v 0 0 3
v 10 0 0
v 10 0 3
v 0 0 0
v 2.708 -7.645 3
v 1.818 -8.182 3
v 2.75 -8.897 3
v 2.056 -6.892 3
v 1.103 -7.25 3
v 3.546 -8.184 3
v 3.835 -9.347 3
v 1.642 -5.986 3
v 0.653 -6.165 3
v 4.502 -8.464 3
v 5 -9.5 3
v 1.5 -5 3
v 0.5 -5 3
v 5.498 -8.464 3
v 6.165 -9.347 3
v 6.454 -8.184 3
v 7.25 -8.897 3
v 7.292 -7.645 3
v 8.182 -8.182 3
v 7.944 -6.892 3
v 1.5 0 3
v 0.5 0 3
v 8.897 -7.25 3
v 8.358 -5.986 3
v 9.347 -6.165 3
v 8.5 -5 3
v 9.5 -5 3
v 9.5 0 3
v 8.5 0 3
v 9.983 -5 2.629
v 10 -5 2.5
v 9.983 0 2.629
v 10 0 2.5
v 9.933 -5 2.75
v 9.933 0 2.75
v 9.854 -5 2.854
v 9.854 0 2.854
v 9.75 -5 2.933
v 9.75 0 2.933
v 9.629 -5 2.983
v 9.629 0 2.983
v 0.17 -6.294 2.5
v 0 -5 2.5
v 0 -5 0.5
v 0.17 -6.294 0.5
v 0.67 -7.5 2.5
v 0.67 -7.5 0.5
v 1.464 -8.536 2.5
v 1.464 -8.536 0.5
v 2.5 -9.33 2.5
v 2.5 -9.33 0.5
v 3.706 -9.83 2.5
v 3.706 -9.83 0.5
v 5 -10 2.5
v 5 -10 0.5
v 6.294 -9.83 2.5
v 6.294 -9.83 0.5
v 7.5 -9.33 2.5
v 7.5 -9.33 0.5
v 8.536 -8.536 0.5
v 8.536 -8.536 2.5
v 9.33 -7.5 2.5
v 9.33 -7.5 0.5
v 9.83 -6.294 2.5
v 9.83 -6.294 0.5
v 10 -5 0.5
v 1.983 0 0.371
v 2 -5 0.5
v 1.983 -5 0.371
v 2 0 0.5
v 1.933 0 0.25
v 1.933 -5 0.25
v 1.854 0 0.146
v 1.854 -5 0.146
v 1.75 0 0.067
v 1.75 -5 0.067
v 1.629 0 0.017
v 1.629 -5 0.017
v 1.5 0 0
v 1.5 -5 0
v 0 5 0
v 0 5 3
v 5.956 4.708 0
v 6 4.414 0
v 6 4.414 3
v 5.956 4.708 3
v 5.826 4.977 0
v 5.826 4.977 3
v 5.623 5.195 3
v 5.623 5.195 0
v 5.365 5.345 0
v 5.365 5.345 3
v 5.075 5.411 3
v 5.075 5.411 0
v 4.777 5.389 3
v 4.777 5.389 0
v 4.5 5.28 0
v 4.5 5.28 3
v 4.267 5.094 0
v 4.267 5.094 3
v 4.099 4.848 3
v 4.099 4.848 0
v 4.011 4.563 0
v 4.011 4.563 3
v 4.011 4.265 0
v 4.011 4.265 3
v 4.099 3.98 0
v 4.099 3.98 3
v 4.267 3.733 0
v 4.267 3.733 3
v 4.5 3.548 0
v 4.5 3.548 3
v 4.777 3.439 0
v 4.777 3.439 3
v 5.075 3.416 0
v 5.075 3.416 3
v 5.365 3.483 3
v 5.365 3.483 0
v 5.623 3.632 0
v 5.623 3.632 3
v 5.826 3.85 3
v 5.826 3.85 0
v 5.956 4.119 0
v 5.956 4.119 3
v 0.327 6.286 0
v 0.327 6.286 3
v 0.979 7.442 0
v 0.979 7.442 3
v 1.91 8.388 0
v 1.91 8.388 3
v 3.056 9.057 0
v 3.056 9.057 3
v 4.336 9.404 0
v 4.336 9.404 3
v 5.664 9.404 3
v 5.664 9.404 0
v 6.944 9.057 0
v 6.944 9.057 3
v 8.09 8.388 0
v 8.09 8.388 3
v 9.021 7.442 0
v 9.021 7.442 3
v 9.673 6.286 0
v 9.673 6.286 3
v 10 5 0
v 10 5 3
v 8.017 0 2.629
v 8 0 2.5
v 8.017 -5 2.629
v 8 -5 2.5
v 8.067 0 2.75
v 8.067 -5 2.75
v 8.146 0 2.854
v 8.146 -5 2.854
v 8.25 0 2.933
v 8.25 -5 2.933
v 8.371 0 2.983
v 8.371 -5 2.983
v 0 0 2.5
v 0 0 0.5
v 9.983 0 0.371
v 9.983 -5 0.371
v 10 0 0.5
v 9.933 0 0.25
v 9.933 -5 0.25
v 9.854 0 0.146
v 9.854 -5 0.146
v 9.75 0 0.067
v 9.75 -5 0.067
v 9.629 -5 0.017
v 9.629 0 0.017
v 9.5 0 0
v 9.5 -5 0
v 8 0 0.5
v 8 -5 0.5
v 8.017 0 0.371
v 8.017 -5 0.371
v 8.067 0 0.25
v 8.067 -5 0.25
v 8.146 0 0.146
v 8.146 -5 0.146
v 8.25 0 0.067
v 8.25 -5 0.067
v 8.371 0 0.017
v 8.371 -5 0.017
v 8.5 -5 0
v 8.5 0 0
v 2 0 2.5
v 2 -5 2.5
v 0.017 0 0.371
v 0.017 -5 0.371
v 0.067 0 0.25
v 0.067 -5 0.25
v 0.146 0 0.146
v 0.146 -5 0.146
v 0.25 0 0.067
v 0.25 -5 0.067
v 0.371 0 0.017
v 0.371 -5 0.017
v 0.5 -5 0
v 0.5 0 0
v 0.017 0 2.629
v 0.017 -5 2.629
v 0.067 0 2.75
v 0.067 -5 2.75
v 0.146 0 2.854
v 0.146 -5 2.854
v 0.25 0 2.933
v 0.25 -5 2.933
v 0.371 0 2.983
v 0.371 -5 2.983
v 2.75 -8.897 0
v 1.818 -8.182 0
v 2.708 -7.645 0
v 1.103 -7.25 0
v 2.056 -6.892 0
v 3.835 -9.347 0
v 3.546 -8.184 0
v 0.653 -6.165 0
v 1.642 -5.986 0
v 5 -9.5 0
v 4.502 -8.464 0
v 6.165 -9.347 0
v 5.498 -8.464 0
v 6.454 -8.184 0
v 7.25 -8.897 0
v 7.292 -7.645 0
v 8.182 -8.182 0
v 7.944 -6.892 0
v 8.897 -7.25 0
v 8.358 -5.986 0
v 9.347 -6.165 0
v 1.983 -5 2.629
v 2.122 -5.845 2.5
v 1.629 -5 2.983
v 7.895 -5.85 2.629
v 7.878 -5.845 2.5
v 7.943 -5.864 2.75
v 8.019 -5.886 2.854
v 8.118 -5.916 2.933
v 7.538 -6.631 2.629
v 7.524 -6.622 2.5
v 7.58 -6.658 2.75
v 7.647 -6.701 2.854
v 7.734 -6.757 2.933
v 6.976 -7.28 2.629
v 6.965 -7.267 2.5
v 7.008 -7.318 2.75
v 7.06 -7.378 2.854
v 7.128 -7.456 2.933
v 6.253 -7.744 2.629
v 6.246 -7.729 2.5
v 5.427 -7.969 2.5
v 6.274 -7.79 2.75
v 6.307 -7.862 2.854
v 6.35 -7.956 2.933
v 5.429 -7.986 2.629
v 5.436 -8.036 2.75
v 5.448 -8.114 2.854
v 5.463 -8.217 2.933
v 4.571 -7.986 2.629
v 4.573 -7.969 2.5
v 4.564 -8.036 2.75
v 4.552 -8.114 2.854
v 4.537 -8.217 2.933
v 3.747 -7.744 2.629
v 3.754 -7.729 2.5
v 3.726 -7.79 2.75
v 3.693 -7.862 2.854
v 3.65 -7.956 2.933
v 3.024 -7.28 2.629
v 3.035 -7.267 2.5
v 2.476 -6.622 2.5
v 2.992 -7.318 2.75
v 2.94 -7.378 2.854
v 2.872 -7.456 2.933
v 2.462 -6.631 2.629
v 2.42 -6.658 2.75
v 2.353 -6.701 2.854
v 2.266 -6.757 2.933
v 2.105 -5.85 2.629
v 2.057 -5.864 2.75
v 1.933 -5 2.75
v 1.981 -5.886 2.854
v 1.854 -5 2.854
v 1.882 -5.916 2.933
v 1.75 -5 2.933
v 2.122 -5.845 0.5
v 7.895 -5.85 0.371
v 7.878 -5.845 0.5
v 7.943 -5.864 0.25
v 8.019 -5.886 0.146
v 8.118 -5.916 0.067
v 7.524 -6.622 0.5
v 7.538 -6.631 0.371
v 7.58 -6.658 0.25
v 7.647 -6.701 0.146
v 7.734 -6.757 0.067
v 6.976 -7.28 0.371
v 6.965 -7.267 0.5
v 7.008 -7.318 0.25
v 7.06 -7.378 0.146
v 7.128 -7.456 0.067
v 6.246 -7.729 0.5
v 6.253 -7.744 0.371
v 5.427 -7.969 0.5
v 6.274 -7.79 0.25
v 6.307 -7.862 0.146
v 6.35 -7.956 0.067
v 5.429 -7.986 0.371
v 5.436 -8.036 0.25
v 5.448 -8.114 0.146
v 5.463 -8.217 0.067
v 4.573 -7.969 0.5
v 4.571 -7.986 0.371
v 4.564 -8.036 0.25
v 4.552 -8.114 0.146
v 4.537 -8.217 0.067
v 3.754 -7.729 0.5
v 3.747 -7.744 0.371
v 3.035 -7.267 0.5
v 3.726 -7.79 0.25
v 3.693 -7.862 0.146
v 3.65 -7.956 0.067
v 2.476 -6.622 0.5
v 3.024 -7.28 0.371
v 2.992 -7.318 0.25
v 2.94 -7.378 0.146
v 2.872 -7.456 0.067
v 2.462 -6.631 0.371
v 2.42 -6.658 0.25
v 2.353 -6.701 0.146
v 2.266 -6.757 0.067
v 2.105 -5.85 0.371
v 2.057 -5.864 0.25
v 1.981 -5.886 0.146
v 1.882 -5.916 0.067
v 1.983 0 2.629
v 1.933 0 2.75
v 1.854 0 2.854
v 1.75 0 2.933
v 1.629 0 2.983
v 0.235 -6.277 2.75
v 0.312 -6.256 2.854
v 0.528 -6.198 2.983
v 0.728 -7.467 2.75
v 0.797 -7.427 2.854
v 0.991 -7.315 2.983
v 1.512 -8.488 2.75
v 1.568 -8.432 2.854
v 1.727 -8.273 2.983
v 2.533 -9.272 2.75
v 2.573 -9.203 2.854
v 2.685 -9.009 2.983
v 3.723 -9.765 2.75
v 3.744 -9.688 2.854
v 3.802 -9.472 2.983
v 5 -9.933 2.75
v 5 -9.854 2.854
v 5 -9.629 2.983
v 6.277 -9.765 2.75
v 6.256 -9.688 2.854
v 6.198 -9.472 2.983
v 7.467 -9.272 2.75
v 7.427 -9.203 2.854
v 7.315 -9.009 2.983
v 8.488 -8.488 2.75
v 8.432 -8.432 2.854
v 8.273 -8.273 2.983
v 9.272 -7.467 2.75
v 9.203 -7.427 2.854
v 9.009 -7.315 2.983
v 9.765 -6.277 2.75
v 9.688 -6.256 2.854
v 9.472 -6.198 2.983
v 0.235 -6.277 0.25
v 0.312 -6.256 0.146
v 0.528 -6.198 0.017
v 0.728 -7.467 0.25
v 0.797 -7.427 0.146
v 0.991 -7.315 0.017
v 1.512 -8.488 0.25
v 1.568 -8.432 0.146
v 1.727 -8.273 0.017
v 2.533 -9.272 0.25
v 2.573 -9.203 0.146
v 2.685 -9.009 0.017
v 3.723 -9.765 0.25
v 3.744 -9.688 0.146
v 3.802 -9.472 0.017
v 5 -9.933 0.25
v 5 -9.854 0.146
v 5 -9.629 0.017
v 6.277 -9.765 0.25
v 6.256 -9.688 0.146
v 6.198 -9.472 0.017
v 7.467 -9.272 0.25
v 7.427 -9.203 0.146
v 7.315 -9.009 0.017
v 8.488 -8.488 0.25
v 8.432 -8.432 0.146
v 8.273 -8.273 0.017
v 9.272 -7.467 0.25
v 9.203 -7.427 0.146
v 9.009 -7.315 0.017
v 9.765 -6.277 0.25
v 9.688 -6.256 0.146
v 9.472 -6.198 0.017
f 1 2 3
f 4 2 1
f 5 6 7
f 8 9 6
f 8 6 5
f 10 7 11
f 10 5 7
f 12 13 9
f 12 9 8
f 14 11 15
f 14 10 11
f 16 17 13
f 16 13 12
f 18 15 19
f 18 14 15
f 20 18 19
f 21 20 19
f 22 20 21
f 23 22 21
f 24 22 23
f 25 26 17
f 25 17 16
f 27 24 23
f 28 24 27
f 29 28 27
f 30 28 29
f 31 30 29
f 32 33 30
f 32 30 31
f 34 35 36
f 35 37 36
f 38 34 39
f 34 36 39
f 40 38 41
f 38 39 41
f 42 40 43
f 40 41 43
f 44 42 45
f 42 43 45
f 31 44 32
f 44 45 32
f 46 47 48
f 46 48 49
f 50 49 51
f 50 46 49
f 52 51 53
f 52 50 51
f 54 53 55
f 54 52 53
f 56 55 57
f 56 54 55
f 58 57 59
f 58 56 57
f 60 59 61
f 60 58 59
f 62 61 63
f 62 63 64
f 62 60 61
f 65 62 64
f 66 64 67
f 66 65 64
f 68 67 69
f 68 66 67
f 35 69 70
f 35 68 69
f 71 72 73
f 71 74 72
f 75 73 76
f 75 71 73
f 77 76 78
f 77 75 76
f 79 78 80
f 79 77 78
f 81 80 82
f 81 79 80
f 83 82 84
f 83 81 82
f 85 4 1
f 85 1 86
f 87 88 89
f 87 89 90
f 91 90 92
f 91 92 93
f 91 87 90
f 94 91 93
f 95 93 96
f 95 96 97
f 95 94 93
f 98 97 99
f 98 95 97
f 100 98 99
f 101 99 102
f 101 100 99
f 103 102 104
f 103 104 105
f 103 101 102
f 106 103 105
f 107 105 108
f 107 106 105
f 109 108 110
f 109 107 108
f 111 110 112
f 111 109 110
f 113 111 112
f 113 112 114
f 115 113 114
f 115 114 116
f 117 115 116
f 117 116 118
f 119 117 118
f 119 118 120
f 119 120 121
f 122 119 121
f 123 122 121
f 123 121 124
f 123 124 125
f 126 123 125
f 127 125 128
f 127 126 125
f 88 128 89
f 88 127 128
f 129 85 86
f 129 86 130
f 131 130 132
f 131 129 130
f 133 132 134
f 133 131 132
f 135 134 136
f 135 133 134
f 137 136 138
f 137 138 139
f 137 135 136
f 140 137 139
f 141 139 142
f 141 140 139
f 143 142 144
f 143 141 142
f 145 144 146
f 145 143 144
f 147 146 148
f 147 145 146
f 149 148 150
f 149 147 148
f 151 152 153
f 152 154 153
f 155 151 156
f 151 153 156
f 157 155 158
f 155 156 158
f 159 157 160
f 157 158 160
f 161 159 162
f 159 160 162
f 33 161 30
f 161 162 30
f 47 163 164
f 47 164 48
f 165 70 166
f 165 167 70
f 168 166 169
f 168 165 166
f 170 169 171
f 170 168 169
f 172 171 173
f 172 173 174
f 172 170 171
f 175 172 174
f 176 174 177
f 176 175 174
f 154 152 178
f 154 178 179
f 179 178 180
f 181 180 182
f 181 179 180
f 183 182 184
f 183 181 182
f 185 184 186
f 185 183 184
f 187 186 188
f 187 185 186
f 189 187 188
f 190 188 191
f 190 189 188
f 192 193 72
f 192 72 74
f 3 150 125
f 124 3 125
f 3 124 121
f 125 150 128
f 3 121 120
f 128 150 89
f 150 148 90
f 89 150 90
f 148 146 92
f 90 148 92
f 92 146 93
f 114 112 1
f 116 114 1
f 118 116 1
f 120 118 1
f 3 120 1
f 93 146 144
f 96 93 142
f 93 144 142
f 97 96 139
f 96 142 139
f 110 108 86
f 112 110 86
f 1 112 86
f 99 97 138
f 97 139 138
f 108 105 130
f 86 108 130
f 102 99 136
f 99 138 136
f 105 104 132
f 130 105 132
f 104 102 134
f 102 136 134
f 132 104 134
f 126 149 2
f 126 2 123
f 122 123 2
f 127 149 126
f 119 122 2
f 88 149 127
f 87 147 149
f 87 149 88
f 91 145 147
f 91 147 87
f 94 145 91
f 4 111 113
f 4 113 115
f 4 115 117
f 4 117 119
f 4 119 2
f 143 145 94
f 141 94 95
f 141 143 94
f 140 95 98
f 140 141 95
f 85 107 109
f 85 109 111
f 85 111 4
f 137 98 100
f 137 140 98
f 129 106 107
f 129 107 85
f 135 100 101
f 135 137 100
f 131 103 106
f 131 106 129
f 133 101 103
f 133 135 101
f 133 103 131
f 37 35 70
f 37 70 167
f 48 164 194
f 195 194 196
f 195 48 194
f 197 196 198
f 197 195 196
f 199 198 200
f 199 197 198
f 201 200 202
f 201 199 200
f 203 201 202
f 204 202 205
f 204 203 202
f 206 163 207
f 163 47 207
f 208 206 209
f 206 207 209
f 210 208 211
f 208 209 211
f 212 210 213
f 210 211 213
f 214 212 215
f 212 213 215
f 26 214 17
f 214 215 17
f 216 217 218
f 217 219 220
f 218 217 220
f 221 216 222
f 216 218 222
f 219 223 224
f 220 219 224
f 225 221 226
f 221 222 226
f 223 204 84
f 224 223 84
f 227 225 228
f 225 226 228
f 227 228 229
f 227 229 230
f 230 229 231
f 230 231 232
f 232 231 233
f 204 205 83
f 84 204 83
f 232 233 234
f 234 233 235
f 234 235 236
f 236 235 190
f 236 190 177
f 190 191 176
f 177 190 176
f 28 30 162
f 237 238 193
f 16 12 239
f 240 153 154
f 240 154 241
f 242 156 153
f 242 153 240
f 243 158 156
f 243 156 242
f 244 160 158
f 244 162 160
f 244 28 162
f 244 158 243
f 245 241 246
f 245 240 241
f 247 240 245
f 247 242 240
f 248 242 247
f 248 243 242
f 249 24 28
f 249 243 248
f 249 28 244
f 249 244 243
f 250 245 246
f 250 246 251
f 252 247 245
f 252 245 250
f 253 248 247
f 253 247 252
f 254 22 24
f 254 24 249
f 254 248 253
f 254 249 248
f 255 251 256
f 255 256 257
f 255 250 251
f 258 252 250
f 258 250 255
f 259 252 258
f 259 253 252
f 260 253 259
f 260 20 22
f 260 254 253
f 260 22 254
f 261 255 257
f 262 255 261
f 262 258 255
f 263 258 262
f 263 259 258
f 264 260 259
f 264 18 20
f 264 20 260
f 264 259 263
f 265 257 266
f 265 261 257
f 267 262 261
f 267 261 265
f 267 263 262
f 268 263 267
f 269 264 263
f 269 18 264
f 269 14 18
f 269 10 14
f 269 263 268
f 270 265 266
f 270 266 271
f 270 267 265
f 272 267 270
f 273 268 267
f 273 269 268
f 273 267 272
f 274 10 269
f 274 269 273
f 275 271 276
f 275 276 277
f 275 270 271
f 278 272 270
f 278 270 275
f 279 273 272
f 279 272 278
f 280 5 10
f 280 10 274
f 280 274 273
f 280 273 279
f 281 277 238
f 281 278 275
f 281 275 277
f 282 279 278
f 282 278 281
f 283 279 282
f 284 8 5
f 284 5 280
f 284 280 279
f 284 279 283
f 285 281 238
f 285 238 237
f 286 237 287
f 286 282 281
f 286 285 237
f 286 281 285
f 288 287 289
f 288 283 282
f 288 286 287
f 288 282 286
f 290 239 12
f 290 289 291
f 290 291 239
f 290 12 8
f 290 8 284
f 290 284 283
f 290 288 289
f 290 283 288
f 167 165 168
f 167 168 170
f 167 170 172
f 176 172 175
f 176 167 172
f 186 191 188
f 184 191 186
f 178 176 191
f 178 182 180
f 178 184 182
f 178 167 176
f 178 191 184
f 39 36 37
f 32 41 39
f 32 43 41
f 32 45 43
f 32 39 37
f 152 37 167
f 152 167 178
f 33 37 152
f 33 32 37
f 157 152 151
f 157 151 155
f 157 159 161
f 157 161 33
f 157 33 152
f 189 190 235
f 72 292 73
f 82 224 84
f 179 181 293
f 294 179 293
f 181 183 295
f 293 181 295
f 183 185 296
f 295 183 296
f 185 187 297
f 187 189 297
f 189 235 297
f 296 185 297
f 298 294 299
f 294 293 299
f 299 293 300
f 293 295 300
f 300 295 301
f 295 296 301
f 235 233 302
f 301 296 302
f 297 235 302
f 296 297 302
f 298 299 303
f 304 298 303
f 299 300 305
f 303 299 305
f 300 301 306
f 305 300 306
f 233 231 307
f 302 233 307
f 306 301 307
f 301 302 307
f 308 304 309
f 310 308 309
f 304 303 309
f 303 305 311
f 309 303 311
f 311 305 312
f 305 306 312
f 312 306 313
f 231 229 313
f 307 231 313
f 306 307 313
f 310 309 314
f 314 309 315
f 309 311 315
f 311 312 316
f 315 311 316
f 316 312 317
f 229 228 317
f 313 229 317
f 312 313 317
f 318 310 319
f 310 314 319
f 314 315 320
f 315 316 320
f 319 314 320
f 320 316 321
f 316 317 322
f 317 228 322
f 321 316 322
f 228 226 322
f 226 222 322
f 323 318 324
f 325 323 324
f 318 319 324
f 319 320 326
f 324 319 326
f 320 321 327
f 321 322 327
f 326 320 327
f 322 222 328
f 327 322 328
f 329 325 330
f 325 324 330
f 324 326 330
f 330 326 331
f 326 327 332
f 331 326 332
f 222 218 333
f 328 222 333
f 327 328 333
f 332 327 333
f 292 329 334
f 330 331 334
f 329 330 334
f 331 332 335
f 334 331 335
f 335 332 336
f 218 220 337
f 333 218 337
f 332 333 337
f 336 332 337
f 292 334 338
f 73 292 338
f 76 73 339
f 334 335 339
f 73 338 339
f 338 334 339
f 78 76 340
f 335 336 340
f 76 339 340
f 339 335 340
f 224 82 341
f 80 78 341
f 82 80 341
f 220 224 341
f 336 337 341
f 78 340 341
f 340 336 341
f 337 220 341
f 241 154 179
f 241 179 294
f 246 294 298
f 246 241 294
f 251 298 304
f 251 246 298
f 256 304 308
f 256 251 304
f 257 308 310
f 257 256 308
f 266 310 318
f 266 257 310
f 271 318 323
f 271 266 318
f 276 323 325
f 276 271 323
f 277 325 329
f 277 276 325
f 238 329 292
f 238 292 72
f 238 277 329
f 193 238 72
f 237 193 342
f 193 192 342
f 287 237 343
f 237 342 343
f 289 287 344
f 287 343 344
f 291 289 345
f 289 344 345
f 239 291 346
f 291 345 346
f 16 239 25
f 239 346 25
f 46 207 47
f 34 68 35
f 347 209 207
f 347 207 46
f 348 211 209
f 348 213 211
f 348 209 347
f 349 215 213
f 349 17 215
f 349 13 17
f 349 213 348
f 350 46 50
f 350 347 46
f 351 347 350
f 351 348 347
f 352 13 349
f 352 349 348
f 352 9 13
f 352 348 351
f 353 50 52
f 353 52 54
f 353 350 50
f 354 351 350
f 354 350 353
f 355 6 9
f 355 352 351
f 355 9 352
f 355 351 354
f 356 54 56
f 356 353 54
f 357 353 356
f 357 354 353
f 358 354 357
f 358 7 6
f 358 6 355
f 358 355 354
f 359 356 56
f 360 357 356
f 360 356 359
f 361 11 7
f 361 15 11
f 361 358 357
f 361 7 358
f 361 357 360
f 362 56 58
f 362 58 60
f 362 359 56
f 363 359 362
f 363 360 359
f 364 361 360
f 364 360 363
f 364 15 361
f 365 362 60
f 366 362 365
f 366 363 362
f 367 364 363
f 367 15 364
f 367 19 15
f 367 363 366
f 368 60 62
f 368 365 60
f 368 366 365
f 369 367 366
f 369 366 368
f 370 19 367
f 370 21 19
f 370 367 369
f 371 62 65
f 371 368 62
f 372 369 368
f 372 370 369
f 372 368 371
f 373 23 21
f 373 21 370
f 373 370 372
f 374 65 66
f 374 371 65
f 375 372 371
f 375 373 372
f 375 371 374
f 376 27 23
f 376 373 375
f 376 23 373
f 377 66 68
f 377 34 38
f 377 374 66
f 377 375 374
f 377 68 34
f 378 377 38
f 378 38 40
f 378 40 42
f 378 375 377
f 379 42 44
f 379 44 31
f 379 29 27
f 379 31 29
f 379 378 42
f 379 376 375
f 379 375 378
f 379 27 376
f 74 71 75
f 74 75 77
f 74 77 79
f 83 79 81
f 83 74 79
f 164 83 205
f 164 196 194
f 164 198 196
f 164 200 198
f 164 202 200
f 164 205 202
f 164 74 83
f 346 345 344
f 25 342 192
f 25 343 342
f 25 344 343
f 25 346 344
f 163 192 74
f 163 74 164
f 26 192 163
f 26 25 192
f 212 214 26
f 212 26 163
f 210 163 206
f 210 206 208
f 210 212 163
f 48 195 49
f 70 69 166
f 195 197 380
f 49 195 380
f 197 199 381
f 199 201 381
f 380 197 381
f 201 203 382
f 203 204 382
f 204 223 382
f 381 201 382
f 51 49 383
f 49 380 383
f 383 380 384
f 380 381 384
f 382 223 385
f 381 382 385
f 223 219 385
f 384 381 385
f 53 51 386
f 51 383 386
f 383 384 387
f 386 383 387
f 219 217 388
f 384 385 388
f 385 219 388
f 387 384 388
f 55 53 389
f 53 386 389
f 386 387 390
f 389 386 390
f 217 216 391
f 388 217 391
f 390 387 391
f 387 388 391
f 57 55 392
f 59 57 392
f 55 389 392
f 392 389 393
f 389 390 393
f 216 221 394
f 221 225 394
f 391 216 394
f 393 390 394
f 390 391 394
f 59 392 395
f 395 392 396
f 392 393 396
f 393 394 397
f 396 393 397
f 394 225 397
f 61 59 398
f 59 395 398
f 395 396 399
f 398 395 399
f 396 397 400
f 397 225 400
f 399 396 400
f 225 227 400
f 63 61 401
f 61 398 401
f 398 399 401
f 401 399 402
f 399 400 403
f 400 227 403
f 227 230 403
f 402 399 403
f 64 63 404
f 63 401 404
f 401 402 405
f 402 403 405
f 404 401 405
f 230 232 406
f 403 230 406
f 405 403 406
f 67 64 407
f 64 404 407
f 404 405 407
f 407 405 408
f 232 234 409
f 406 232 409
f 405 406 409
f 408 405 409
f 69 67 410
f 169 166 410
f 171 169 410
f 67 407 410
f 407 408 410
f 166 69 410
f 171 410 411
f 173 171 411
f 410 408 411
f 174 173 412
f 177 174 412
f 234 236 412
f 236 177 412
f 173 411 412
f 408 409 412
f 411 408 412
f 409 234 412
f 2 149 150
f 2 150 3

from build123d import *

# Parameters (mm, degrees)
SKETCH1_R           = 1
BOSS_EXTRUDE1_DEPTH = 3
BOSS_EXTRUDE2_DEPTH = 3
FILLET7_R           = 0.5


with BuildPart() as part:
    # Sketch1 → Boss-Extrude1 (new body)
    with BuildSketch(Plane.XY):
        with BuildLine():
            Line((0, 0), (0, 5))
            ThreePointArc((0, 5), (5, 9.447928245), (10, 5))
            Line((10, 5), (10, 0))
            Line((10, 0), (0, 0))
        make_face()
        with Locations((5, 4.413666988)):
            Circle(SKETCH1_R, mode=Mode.SUBTRACT)
    extrude(amount=BOSS_EXTRUDE1_DEPTH)


with BuildPart() as body_2:
    # Sketch2 → Boss-Extrude2 (new body)
    with BuildSketch(Plane.XY.offset(3)):
        with BuildLine():
            ThreePointArc((2, -1), (0.527864045, -2.763932023), (0, -5))
            ThreePointArc((0, -5), (5, -10), (10, -5))
            ThreePointArc((10, -5), (9.472135955, -2.763932023), (8, -1))
            Line((8, -1), (8, -5))
            ThreePointArc((8, -5), (5, -8), (2, -5))
            Line((2, -5), (2, -1))
        make_face()
        with BuildLine():
            Line((2, 0), (0, 0))
            Line((0, 0), (0, -5))
            ThreePointArc((0, -5), (0.527864045, -2.763932023), (2, -1))
            Line((2, -1), (2, 0))
        make_face()
        with BuildLine():
            ThreePointArc((8, -1), (9.472135955, -2.763932023), (10, -5))
            Line((10, -5), (10, 0))
            Line((10, 0), (8, 0))
            Line((8, 0), (8, -1))
        make_face()
    extrude(amount=-BOSS_EXTRUDE2_DEPTH)

    # Fillet7
    fillet7_edges = [body_2.edges().sort_by_distance(p)[0] for p in [
        (10, -2.5, 3),
        (5, -10, 3),
        (0, -2.5, 3),
        (2, -2.5, 3),
        (5, -8, 3),
        (0, -2.5, 0),
        (5, -10, 0),
        (10, -2.5, 0),
        (8, -2.5, 0),
        (5, -8, 0),
        (2, -2.5, 0),
        (8, -2.5, 3),
    ]]
    fillet(fillet7_edges, radius=FILLET7_R)


solid = Compound([part.part, body_2.part])
